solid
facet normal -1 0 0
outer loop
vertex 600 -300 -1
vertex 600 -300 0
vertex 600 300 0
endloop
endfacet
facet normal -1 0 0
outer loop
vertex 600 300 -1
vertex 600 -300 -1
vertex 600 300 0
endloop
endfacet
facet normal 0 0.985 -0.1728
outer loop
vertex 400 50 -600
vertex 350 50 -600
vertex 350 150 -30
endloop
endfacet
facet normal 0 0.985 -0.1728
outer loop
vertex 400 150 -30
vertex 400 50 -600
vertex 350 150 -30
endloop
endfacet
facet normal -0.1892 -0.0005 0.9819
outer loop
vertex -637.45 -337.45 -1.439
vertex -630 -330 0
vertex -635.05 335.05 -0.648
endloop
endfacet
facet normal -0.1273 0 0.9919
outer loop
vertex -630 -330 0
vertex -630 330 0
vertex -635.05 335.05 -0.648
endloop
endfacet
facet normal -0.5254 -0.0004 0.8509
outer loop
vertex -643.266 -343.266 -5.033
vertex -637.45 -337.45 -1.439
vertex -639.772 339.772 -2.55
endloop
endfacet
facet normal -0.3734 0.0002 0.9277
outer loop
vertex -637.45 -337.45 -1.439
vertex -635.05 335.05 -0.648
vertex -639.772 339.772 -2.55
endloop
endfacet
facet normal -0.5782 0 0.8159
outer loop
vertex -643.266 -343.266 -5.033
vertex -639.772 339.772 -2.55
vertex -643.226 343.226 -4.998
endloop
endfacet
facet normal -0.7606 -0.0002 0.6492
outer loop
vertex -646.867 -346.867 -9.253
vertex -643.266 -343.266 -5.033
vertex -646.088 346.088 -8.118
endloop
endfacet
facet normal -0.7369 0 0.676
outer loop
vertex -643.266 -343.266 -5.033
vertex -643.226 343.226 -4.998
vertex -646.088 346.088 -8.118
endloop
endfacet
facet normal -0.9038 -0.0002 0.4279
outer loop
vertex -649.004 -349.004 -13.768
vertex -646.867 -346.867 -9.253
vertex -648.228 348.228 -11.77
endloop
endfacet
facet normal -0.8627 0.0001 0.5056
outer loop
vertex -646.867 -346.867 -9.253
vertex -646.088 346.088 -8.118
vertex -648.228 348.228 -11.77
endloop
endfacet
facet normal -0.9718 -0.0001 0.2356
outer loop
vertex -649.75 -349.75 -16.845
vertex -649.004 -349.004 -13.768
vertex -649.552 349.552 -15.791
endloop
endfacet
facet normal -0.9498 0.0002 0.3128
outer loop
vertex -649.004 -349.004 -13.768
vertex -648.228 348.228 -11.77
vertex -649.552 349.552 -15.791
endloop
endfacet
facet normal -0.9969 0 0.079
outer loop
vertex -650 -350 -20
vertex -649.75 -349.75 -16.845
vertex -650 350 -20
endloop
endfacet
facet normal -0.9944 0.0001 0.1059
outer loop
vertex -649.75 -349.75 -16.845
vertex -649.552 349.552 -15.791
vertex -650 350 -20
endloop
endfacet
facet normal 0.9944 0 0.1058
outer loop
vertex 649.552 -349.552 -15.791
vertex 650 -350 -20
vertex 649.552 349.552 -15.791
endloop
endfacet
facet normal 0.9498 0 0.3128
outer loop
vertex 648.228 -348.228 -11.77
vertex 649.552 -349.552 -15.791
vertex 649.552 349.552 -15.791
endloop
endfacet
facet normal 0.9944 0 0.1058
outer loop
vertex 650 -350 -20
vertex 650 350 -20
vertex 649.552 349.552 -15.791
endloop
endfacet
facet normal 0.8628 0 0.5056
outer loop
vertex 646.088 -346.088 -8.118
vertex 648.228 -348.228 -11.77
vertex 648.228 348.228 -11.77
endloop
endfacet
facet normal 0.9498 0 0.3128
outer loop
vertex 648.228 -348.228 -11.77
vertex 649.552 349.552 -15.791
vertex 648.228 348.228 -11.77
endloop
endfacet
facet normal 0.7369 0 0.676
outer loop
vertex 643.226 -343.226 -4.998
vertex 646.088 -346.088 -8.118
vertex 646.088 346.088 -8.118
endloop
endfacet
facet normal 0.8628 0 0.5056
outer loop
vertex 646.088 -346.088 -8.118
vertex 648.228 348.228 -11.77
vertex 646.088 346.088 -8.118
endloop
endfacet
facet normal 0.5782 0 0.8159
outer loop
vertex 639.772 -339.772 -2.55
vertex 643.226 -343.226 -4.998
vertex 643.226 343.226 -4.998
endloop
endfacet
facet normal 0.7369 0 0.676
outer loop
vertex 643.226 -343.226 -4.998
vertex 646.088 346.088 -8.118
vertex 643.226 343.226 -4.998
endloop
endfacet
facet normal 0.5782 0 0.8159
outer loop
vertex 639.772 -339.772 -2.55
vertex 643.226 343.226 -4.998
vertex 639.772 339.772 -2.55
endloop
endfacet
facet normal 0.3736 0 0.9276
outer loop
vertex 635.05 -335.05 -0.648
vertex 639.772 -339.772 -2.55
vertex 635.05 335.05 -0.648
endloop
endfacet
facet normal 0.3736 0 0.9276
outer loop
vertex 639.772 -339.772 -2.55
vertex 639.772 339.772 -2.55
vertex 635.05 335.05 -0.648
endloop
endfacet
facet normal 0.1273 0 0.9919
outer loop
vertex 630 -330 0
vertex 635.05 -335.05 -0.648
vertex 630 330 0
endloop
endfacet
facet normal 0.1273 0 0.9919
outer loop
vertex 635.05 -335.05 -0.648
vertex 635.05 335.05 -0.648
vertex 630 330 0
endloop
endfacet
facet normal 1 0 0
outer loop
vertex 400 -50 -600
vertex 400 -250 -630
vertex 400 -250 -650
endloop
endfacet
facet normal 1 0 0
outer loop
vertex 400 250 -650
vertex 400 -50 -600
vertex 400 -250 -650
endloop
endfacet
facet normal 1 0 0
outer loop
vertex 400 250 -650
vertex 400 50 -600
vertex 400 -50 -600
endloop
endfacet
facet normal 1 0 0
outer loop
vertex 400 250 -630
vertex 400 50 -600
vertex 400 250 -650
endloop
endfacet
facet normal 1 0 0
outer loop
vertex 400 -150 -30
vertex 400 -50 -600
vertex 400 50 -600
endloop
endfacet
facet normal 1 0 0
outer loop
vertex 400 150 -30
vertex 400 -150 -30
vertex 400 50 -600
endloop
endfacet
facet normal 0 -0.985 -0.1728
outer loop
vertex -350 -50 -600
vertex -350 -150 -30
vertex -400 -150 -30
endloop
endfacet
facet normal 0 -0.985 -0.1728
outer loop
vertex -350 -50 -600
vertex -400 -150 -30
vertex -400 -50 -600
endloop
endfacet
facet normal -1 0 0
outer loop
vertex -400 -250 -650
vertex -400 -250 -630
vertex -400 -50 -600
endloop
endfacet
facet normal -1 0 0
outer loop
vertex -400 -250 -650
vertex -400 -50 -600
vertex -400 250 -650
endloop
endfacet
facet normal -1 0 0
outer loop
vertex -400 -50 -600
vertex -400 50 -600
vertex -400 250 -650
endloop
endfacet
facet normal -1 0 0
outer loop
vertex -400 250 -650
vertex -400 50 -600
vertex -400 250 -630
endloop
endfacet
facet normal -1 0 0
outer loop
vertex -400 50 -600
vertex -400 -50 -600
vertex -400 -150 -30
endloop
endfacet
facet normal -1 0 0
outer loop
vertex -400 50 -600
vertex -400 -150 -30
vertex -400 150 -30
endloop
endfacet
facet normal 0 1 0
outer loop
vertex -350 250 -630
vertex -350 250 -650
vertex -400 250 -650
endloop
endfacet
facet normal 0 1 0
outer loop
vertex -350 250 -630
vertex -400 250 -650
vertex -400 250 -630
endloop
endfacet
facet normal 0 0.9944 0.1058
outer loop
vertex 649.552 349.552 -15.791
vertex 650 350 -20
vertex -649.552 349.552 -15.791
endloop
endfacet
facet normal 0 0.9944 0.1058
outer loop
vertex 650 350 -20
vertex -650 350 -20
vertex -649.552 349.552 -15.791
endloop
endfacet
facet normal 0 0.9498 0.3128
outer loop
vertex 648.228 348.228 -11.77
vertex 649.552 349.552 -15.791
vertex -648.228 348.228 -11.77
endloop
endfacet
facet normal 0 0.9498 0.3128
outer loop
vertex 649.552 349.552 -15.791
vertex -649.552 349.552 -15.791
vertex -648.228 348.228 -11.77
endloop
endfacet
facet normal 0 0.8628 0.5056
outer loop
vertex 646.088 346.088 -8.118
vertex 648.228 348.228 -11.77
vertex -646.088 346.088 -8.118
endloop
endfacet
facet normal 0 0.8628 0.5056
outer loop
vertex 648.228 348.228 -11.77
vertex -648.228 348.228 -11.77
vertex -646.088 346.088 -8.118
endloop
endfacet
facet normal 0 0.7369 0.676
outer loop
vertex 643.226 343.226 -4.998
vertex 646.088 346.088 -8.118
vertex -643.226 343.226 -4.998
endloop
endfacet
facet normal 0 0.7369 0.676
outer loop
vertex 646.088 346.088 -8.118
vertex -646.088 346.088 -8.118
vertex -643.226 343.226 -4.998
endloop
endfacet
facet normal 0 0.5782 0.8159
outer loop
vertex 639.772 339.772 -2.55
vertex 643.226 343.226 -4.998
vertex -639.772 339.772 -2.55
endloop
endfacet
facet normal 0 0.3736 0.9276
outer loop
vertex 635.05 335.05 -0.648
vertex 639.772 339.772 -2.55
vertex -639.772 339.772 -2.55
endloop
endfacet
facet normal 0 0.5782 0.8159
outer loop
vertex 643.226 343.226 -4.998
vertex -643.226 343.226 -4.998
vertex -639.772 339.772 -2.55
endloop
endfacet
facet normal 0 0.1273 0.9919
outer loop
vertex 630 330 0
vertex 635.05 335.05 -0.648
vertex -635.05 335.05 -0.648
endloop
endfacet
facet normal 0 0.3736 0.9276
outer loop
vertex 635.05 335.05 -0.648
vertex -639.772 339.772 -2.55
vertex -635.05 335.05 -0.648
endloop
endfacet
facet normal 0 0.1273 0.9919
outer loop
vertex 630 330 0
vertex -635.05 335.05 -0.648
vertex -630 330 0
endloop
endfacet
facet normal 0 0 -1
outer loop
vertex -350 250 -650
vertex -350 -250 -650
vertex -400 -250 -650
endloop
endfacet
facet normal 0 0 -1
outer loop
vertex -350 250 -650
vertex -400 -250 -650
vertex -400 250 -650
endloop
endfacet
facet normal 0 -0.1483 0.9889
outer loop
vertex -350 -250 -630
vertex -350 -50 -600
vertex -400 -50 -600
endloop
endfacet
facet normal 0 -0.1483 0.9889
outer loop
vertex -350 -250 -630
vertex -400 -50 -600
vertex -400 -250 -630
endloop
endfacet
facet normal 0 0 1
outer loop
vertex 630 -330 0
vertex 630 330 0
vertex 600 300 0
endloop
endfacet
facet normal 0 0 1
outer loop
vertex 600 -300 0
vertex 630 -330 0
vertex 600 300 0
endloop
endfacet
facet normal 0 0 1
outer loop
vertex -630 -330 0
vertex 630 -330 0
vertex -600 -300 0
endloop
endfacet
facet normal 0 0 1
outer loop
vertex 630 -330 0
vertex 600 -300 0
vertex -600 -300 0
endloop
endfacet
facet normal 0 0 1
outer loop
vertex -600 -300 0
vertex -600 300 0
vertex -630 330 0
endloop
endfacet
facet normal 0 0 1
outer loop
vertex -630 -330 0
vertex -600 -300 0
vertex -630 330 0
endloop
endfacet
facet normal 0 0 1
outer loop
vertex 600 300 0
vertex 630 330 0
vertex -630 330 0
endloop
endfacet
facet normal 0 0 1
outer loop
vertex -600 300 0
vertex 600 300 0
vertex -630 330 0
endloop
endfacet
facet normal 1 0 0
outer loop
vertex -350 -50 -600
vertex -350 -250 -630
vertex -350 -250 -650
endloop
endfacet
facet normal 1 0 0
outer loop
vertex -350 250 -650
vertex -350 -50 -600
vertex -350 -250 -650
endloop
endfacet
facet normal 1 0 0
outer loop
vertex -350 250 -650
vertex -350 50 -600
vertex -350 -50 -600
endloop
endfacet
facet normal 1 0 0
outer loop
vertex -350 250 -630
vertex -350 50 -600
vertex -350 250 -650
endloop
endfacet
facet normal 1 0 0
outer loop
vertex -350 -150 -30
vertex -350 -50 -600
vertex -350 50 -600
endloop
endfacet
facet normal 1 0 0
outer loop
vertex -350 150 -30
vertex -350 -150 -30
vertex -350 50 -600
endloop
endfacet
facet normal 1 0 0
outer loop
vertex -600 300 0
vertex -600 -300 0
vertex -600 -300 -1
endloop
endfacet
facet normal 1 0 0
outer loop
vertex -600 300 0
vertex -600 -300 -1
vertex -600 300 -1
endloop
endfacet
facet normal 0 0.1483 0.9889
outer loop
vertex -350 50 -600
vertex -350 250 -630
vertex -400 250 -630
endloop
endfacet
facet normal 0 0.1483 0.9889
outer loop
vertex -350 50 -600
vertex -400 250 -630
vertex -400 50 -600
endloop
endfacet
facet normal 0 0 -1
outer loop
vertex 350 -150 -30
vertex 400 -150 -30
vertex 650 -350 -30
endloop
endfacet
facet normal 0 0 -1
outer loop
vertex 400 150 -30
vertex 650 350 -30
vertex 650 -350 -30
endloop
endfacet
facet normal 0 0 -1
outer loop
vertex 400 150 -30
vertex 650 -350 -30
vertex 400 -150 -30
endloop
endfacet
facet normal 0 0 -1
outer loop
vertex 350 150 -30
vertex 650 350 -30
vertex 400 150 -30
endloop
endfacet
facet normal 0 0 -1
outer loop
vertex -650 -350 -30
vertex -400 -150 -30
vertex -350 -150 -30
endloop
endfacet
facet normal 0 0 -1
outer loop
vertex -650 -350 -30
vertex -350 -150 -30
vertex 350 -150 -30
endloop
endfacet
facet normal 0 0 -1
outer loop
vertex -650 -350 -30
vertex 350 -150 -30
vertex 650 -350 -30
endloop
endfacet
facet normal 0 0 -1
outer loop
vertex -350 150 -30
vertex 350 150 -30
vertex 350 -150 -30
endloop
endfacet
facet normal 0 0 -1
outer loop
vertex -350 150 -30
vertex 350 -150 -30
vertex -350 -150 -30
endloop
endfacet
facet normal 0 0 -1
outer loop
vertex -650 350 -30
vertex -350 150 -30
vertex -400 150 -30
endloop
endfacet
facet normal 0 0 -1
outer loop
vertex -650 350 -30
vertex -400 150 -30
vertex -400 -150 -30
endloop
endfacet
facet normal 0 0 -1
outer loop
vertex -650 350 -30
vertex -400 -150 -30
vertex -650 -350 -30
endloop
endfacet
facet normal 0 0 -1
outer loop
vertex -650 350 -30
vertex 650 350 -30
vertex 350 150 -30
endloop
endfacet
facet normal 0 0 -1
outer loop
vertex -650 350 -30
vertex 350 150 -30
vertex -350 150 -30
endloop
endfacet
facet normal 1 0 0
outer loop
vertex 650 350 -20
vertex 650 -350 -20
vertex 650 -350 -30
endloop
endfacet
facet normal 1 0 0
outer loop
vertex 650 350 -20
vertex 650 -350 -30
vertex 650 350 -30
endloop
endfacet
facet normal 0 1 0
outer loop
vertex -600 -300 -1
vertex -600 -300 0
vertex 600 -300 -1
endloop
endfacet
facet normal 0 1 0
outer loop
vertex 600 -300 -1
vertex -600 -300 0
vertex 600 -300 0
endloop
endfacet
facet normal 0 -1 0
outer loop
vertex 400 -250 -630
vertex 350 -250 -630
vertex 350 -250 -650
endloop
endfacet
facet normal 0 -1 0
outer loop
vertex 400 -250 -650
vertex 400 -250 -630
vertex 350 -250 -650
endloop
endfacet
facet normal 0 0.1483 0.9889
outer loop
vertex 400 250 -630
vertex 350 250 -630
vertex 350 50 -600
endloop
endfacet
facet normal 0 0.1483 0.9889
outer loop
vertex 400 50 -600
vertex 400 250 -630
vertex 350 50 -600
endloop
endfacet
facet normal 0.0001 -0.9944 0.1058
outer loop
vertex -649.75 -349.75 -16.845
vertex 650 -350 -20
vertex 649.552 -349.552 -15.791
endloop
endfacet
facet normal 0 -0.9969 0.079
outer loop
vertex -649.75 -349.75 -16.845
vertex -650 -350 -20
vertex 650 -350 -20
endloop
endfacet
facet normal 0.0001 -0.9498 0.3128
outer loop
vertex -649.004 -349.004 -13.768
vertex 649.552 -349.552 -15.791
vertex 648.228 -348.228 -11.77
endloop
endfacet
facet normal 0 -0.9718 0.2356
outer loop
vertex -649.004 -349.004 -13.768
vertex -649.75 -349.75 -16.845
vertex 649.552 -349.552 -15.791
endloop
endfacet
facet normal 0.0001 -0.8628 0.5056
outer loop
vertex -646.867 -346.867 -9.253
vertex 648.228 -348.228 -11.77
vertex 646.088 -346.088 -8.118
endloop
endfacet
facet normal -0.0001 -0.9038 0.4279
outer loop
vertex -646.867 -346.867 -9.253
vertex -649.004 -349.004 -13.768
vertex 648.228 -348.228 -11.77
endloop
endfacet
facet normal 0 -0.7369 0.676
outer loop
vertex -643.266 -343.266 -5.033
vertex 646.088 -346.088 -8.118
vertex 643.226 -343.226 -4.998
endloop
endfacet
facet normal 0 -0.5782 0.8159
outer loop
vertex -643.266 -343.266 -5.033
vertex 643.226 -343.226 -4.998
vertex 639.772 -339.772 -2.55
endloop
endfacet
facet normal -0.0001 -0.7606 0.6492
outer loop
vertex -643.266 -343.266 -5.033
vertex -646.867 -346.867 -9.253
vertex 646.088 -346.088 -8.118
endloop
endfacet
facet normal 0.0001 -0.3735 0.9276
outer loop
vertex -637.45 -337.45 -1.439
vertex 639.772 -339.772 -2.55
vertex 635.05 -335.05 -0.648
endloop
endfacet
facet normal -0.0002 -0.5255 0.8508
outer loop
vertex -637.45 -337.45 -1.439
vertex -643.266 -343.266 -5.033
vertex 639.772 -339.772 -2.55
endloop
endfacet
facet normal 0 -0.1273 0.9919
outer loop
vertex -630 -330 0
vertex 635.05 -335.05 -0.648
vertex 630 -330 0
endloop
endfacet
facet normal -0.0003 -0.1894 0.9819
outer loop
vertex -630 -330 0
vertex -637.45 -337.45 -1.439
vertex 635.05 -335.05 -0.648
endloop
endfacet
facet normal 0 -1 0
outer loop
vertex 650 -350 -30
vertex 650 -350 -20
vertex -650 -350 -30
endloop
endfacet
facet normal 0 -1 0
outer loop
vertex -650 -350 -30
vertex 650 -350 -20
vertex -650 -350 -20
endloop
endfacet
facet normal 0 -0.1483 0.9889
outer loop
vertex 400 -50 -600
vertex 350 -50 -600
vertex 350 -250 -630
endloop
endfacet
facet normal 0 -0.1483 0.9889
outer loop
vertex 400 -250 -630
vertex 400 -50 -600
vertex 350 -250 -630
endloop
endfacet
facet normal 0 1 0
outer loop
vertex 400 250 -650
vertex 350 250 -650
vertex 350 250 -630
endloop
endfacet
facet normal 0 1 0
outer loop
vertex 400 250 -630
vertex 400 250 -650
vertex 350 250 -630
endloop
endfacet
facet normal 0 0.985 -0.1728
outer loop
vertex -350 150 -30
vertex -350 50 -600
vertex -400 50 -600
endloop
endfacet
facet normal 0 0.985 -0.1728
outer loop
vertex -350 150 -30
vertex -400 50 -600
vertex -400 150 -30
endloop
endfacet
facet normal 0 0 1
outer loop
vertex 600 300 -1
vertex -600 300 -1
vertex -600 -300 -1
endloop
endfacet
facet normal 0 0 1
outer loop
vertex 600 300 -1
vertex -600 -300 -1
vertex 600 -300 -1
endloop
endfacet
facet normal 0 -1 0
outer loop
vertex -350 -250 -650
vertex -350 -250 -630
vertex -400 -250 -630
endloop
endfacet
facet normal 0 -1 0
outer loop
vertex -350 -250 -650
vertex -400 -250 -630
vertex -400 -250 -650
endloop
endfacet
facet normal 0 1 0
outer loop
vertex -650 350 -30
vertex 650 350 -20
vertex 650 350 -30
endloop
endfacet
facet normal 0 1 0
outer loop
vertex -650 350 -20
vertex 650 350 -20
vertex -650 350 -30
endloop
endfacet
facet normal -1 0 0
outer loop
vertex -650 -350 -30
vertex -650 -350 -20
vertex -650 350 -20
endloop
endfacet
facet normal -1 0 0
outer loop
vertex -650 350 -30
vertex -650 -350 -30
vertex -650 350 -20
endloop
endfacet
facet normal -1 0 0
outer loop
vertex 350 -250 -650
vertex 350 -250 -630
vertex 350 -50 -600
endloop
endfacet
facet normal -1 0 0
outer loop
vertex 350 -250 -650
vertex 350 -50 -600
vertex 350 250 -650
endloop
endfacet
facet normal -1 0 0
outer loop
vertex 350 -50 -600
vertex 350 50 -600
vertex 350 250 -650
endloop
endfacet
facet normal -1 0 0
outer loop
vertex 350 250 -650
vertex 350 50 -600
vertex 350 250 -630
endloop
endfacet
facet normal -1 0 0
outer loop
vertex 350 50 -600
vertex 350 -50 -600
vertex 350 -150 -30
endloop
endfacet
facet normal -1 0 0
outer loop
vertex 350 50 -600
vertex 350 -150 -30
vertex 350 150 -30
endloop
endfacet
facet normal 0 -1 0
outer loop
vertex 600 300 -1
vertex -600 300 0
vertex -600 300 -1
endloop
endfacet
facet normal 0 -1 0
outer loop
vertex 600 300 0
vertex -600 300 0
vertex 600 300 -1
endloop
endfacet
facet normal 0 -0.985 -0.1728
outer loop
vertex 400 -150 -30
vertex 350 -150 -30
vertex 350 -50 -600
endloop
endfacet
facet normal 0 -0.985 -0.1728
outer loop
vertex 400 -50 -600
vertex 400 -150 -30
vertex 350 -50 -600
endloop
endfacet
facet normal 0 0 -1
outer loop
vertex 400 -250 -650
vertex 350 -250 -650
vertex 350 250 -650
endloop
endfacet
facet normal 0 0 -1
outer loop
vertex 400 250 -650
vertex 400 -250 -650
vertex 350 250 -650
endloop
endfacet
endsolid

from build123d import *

# Parameters (mm, degrees)
F0_W     = 650
F0_H     = 700
F1_DEPTH = 30
F3_START = 350
F3_DEPTH = 50
F5_R     = 20
F6_W     = 1200
F6_H     = 600
F7_DEPTH = 1


with BuildPart() as f1:
    # F0 (on Top) → F1 (new body)
    with BuildSketch(Plane.XY):
        with Locations((325, 0)):
            Rectangle(F0_W, F0_H)
    extrude(amount=-F1_DEPTH)

    # F2 (on Right) → F3 (join)
    with BuildSketch(Plane.YZ.offset(F3_START)):
        Polygon((150, -30), (0, -30), (0, -650), (250, -650), (250, -630), (50, -600), align=None)
        Polygon((0, -650), (0, -30), (-150, -30), (-50, -600), (-250, -630), (-250, -650), align=None)
    extrude(amount=F3_DEPTH)

    # F4: F1 across plane


with BuildPart() as f1_1:
    add(f1.part)
    add(f1.part.mirror(Plane.YZ))

    # F5
    f5_edges = [f1_1.edges().sort_by_distance(p)[0] for p in [
        (0, 350, 0),
        (-650, 0, 0),
        (0, -350, 0),
        (650, 0, 0),
    ]]
    fillet(f5_edges, radius=F5_R)

    # F6 (on Top) → F7 (cut)
    with BuildSketch(Plane.XY):
        Rectangle(F6_W, F6_H)
    extrude(amount=-F7_DEPTH, mode=Mode.SUBTRACT)


solid = f1_1.part
